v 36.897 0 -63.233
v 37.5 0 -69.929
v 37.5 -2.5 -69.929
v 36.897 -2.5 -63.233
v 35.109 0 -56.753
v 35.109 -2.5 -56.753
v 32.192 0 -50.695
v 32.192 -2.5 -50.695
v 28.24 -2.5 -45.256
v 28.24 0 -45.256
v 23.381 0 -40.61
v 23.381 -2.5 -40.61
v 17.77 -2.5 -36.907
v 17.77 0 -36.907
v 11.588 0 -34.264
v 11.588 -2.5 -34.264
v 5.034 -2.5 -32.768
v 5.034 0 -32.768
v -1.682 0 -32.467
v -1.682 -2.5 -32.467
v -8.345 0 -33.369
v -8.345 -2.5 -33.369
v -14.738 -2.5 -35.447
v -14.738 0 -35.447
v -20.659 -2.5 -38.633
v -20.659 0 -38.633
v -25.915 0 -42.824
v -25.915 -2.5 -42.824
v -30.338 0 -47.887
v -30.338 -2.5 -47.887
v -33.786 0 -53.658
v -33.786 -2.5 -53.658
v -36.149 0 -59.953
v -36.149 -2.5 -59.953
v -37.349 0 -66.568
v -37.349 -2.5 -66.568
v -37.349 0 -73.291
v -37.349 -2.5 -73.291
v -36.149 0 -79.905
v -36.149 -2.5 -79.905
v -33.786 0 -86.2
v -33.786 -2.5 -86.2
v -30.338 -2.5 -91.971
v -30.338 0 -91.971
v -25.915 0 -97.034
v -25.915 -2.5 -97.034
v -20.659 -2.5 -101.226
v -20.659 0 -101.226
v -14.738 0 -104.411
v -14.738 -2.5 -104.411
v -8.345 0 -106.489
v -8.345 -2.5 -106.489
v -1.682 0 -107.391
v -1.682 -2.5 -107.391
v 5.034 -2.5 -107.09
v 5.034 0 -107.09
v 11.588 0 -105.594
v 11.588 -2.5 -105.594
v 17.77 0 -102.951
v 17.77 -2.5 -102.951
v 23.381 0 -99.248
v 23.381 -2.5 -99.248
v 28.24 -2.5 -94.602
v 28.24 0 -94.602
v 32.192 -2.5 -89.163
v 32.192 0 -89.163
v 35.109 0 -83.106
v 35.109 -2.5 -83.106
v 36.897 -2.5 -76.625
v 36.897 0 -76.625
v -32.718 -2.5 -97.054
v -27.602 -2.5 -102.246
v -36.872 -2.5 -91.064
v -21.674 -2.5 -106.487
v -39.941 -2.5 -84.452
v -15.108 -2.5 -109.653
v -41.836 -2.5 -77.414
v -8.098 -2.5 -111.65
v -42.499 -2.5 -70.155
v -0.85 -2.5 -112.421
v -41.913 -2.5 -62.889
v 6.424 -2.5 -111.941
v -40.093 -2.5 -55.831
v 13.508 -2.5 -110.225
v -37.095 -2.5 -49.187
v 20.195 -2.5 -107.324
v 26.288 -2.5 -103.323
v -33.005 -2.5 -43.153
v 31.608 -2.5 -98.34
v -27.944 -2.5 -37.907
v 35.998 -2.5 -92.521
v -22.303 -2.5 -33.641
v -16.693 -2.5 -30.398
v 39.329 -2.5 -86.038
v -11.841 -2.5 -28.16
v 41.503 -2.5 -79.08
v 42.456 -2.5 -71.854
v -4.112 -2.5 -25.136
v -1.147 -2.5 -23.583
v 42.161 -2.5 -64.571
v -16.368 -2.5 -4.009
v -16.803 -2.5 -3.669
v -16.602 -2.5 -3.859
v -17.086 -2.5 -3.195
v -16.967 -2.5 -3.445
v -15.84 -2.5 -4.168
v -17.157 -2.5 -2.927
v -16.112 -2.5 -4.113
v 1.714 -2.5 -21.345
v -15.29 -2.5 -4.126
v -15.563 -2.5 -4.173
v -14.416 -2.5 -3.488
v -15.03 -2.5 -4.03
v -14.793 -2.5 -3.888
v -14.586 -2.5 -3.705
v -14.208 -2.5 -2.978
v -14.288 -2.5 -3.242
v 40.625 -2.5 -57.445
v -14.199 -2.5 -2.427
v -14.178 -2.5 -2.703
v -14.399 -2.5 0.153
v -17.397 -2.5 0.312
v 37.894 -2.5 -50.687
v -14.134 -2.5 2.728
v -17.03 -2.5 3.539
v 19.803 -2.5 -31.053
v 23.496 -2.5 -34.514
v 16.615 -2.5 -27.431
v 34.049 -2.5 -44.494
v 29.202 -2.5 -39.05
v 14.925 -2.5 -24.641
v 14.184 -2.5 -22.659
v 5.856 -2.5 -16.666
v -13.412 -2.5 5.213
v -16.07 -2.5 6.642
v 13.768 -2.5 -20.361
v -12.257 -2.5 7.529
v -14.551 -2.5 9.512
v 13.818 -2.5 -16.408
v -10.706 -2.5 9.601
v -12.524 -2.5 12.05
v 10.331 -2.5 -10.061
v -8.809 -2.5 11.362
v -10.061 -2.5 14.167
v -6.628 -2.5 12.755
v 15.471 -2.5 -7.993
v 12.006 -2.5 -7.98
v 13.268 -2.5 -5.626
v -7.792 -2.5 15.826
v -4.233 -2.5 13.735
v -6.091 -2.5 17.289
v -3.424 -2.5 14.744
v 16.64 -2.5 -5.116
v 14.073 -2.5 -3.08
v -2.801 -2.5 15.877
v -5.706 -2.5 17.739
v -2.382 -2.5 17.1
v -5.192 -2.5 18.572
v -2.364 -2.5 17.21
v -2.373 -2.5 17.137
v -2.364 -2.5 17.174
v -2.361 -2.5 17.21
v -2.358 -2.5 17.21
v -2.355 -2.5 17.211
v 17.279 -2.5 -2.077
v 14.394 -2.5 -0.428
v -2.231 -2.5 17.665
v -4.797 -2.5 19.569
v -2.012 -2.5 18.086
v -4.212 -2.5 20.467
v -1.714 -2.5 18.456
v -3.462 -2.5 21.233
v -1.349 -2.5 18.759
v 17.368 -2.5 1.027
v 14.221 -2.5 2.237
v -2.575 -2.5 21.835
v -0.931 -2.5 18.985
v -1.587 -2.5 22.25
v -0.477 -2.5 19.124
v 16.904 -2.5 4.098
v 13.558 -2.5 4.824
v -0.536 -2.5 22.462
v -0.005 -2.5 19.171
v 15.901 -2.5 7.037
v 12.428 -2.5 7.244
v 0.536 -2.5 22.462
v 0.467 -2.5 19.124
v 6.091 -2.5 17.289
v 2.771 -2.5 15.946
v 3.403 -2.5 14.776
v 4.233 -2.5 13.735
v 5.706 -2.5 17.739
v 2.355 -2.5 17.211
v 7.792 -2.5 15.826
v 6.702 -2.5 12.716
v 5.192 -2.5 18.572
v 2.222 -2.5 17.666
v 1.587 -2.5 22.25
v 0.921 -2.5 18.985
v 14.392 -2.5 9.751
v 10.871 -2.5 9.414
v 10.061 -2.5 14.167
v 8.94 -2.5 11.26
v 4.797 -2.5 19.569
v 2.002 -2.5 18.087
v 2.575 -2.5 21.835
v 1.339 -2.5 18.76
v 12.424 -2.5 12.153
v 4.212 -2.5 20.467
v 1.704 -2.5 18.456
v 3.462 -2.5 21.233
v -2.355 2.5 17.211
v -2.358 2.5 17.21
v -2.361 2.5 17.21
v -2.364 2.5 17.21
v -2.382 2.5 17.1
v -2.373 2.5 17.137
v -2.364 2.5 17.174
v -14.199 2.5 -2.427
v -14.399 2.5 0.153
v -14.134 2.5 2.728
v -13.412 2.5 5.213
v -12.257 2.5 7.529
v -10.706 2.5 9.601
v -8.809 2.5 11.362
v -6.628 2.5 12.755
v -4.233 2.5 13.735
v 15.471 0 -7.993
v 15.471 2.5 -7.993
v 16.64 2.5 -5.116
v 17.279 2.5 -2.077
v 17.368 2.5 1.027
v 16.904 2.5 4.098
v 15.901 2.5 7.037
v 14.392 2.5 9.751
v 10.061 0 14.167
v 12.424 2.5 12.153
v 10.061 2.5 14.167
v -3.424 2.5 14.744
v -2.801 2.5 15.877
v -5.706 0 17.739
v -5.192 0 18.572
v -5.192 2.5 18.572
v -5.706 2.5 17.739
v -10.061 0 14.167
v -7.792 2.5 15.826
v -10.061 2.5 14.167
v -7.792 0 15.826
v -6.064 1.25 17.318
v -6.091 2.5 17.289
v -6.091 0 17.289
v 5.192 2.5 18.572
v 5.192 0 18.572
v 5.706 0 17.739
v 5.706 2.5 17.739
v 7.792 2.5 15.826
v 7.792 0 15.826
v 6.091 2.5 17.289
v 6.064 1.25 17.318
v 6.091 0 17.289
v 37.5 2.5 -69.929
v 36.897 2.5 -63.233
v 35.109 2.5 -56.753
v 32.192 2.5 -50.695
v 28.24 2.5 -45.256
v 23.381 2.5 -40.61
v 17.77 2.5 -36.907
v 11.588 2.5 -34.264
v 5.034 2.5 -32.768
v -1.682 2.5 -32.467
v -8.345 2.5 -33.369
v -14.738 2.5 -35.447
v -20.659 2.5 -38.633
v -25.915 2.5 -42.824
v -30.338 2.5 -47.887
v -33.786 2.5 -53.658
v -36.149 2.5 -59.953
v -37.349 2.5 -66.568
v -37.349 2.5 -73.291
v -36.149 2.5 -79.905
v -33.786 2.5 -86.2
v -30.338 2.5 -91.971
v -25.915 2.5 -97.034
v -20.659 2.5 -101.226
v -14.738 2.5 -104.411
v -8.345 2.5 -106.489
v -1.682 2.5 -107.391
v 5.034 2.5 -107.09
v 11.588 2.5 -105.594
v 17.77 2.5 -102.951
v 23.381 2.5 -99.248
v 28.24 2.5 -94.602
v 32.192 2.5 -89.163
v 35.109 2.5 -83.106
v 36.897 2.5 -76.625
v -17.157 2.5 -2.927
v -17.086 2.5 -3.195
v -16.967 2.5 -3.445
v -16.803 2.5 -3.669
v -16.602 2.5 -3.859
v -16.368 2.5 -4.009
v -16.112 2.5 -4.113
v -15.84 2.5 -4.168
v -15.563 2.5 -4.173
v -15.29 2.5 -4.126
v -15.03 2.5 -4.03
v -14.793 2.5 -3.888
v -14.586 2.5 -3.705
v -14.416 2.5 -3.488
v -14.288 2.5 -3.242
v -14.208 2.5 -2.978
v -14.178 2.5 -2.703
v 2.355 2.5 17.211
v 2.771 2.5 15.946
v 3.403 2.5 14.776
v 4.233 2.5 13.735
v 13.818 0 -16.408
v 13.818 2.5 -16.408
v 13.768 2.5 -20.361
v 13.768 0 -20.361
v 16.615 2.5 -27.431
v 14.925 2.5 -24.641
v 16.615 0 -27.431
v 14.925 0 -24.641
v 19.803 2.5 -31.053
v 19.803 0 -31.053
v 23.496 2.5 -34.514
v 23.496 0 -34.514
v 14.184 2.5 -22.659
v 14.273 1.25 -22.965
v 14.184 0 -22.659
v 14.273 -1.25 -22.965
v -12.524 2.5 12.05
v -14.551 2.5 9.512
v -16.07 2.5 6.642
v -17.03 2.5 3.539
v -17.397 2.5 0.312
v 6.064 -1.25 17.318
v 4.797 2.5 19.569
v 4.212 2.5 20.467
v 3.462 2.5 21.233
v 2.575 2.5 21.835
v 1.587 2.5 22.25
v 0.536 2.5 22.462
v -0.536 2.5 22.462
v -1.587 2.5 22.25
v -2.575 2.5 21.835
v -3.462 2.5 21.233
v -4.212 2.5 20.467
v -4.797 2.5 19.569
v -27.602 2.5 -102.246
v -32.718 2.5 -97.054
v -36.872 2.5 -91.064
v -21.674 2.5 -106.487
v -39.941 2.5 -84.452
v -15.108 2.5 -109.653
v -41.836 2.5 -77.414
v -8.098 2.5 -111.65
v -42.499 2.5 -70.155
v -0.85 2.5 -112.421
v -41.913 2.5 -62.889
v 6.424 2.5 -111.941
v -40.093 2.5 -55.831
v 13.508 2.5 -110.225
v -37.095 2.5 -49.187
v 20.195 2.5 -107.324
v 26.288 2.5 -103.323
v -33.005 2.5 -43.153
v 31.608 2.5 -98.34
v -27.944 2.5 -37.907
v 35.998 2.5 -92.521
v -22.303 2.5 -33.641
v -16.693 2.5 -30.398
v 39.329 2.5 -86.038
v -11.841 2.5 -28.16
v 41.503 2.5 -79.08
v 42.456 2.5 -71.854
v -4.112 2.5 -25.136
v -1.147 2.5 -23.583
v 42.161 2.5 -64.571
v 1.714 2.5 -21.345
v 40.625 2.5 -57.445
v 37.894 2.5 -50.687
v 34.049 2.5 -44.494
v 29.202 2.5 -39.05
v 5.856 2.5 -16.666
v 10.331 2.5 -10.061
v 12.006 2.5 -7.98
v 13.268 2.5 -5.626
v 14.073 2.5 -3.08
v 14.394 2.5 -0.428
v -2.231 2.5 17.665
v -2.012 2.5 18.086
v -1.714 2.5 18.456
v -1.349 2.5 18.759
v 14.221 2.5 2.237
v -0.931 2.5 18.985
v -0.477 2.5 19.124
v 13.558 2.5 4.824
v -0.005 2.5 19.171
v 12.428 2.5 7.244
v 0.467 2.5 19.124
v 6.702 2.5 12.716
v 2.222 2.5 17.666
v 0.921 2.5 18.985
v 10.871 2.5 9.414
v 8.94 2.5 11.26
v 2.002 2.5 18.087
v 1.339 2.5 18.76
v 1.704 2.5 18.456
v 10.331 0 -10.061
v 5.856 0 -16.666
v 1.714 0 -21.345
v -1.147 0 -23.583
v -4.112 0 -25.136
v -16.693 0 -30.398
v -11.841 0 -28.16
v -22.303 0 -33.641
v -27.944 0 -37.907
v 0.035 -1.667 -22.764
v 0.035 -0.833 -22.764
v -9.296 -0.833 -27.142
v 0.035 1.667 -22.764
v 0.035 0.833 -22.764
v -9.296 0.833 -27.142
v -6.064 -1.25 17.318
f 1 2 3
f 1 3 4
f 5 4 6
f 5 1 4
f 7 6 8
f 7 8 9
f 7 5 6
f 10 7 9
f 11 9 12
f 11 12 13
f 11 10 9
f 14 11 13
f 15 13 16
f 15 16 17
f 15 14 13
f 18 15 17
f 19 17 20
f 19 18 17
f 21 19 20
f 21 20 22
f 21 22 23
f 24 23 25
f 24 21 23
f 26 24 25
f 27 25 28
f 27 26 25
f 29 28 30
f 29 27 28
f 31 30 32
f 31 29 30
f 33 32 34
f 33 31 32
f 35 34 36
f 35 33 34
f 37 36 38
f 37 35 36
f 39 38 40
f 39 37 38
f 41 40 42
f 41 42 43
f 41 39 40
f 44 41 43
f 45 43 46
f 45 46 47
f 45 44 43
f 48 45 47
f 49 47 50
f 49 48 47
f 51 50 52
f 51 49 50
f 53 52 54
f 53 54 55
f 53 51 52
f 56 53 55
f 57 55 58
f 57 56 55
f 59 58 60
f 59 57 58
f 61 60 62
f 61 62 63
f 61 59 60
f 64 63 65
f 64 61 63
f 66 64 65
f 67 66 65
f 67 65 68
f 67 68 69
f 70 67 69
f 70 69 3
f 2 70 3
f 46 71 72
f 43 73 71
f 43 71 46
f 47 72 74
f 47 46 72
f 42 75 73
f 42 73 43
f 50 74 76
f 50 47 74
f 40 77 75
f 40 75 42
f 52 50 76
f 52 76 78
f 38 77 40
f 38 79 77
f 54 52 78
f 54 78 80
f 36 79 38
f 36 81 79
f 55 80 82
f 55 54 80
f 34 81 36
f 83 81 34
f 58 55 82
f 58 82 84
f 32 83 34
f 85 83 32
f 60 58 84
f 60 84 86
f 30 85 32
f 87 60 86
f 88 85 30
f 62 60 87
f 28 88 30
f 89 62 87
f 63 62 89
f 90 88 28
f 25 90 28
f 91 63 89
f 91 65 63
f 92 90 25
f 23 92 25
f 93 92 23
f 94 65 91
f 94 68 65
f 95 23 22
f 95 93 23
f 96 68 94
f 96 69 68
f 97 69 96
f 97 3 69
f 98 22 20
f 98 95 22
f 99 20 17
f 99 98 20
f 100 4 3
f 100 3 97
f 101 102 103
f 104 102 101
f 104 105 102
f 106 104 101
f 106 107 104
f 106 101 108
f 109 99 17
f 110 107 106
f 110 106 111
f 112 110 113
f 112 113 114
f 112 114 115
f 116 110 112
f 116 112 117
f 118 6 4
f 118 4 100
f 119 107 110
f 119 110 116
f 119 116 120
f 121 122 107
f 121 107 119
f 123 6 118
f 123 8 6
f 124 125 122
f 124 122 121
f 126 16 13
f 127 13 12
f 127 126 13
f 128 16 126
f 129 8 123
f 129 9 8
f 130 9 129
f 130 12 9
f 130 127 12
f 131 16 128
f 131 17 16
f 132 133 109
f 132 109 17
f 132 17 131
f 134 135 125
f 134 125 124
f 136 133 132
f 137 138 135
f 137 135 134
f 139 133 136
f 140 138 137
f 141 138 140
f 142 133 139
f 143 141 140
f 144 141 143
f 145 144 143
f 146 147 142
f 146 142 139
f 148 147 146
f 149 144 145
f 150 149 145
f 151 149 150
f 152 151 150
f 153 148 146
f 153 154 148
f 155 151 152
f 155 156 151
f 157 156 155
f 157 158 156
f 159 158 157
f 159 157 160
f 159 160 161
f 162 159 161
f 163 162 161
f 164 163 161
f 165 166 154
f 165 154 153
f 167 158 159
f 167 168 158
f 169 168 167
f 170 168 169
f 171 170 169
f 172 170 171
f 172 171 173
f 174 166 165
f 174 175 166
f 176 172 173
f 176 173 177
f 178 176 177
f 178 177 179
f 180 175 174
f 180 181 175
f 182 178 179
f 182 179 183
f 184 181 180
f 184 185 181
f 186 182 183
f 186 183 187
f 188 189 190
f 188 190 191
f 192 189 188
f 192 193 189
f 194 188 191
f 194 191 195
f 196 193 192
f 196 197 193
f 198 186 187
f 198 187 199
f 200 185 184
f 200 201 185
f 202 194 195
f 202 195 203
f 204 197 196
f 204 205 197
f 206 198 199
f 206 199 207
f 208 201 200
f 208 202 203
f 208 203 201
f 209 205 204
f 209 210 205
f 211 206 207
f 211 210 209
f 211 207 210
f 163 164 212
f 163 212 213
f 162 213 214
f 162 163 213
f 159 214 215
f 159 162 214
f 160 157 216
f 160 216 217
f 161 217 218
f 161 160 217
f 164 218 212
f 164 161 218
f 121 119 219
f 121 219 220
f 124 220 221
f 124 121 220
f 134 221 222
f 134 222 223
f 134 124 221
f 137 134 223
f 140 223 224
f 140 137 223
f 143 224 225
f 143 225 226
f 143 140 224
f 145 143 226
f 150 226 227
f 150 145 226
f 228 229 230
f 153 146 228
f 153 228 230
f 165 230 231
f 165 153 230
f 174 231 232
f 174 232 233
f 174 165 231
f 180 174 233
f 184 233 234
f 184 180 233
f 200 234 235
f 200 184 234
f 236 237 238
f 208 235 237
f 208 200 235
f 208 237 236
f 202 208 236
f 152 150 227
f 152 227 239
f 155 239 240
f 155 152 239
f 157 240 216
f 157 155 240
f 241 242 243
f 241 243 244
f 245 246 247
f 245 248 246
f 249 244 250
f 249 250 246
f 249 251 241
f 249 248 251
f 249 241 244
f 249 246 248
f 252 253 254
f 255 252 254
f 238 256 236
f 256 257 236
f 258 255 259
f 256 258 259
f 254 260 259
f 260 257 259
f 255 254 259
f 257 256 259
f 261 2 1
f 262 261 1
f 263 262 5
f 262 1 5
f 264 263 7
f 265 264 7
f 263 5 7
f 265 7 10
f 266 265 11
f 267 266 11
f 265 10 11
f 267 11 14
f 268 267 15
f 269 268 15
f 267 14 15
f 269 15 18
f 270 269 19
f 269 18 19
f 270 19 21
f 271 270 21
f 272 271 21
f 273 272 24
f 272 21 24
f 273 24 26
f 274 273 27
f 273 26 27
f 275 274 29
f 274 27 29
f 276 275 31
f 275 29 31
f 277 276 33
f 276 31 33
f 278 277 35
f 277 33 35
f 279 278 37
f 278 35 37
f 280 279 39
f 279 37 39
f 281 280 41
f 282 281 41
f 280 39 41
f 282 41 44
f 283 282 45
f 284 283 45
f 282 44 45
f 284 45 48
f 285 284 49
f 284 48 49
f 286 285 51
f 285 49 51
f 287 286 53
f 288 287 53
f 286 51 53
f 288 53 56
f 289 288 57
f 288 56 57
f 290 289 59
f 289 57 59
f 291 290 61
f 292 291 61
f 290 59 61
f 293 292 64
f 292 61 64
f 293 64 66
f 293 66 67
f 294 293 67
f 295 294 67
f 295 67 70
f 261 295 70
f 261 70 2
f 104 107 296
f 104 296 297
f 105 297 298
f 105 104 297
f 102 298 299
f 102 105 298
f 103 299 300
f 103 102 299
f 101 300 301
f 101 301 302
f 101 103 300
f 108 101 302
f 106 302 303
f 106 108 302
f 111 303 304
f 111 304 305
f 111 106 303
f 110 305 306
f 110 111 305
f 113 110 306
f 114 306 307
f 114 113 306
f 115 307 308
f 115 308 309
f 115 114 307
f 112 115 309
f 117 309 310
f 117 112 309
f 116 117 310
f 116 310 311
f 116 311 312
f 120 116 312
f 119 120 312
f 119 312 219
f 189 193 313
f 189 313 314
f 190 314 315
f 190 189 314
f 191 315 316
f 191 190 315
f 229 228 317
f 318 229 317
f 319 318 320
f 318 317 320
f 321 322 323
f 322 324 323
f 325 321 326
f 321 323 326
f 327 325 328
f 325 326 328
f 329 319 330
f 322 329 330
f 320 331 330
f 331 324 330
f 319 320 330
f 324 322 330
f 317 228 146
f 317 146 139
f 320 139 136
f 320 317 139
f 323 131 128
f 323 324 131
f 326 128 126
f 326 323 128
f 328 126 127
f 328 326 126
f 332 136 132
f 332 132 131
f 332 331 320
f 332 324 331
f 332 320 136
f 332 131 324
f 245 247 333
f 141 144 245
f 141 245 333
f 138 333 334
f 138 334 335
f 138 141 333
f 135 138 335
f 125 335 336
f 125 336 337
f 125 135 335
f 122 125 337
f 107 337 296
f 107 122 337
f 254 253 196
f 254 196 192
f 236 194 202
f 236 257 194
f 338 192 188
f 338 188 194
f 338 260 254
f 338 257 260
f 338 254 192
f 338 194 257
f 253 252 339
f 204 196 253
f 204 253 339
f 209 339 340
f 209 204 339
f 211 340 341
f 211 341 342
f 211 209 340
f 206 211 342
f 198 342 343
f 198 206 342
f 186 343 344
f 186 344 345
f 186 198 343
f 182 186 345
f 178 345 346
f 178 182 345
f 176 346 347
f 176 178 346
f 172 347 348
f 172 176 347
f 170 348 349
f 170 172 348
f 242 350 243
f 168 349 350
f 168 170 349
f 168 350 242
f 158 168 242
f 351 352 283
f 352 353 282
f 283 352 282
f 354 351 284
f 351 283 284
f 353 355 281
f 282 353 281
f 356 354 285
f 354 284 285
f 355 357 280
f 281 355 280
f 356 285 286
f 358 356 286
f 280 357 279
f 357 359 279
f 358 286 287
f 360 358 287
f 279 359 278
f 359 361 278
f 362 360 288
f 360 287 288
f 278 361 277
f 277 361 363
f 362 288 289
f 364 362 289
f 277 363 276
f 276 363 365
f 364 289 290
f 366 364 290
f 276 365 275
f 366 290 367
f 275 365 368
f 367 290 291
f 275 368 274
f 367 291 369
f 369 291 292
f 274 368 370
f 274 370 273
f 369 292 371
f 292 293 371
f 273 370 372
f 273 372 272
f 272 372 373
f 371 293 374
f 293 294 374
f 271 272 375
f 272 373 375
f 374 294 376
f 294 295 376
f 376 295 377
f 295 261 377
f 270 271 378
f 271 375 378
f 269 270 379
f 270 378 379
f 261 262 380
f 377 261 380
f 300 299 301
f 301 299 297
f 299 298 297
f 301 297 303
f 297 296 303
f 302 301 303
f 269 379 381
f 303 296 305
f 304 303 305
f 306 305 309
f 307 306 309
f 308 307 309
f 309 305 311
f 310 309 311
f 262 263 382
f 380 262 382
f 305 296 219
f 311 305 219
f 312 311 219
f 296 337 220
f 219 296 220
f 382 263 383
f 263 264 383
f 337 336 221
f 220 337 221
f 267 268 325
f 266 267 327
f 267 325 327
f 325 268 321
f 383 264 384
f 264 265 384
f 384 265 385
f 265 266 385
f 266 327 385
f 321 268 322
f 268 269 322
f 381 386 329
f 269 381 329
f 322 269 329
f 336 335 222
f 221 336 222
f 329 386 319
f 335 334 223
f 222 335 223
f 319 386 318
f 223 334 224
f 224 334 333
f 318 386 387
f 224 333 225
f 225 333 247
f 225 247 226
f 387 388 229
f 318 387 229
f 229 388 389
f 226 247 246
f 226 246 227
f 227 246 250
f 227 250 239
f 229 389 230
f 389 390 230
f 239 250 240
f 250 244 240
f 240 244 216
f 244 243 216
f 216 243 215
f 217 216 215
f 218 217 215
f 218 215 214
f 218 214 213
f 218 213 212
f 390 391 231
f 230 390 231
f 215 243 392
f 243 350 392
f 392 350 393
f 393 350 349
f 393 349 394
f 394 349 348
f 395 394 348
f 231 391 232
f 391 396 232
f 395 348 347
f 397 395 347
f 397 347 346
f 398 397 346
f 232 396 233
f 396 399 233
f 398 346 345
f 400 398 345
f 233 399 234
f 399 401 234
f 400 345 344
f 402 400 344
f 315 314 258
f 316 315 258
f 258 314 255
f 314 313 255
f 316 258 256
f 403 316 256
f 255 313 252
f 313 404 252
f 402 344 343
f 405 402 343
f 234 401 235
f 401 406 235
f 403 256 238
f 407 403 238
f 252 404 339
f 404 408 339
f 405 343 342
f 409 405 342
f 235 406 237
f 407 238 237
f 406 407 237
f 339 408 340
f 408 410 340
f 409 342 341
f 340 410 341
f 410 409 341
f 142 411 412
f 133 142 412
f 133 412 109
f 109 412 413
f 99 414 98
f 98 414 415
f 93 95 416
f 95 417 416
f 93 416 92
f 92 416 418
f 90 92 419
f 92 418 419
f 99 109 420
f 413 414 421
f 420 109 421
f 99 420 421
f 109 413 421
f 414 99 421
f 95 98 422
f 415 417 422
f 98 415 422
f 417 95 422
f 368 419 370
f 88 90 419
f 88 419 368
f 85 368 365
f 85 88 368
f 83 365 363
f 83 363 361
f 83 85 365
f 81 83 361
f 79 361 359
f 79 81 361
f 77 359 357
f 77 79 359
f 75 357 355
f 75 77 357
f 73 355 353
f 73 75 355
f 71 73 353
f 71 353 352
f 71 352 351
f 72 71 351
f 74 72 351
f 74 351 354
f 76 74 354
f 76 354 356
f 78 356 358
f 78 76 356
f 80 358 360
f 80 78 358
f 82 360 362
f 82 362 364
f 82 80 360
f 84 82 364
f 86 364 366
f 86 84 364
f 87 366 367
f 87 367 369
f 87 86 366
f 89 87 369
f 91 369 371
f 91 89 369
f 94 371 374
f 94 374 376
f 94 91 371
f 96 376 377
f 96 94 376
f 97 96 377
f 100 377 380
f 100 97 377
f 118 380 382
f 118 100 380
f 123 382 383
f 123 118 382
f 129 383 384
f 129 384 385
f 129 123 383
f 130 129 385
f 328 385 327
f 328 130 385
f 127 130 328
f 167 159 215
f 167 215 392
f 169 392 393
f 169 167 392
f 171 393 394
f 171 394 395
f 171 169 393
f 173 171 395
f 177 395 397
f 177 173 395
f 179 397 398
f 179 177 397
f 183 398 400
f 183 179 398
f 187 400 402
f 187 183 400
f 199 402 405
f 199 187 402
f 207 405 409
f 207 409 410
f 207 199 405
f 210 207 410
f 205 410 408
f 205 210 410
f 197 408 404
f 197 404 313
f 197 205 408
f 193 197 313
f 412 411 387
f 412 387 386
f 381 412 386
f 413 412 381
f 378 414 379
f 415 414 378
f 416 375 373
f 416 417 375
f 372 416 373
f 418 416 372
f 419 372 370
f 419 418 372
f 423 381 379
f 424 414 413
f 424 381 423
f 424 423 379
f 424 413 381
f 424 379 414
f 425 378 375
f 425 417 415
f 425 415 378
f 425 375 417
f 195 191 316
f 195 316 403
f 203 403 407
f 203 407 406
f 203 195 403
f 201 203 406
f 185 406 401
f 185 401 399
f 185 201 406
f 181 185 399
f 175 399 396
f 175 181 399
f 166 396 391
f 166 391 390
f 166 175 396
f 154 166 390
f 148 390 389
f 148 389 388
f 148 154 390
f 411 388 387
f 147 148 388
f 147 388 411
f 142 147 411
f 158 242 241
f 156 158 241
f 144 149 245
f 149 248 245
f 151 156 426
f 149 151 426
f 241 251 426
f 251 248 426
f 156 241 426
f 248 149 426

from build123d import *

# Parameters (mm, degrees)
F0_R     = 37.5
F1_DEPTH = 2.5


with BuildPart() as f1:
    # F0 (on Front) → F1 (new body, symmetric)
    with BuildSketch(Plane.XZ):
        with BuildLine():
            ThreePointArc((23.495791584, -34.5144310796), (-2.7972530191, -27.5212402414), (-27.9439404953, -37.9074340379))
            ThreePointArc((-27.9439404953, -37.9074340379), (-17.5873893593, -108.6193138327), (42.5, -69.9290859253))
            ThreePointArc((42.5, -69.9290859253), (37.4487726255, -49.8333294369), (23.495791584, -34.5144310796))
        make_face()
        with Locations((0, -69.9290859253)):
            Circle(F0_R, mode=Mode.SUBTRACT)
        with BuildLine():
            add(Edge.make_bspline(
                [(5.1920566863, 18.5723408589), (5.4030836199, 18.1737175795), (6.009346047, 17.0894557175), (8.4647401185, 15.2993210086), (10.0607038312, 14.1674244584)],
                knots=[0, 0, 0, 0, 0.353980682, 1, 1, 1, 1], degree=3))
            ThreePointArc((5.1920566863, 18.5723408589), (0, 22.4882426928), (-5.1920566863, 18.5723408589))
            add(Edge.make_bspline(
                [(-5.1920566863, 18.5723408589), (-5.4030836199, 18.1737175795), (-6.009346047, 17.0894557175), (-8.4647401185, 15.2993210086), (-10.0607038312, 14.1674244584)],
                knots=[0, 0, 0, 0, 0.353980682, 1, 1, 1, 1], degree=3))
            ThreePointArc((-10.0607038312, 14.1674244584), (-16.0703171245, 6.6420670409), (-17.1570047894, -2.9269227761))
            ThreePointArc((-17.1570047894, -2.9269227761), (-16.488459767, -3.9392853203), (-15.2897240847, -4.1260020361))
            ThreePointArc((-15.2897240847, -4.1260020361), (-14.4157806287, -3.4876204113), (-14.1989005153, -2.4273038173))
            ThreePointArc((-14.1989005153, -2.4273038173), (-12.2569494075, 7.5291203707), (-4.2325370023, 13.7347921529))
            ThreePointArc((-4.2325370023, 13.7347921529), (-3.0879498251, 15.2971102039), (-2.3815860794, 17.1004315168))
            ThreePointArc((-2.3815860794, 17.1004315168), (-2.3733660378, 17.1550903584), (-2.3638894327, 17.2095454042))
            ThreePointArc((-2.3638894327, 17.2095454042), (-0.0049388321, 19.1708665497), (2.3550204808, 17.2107592534))
            ThreePointArc((2.3550204808, 17.2107592534), (3.060795291, 15.3469315093), (4.2325370023, 13.7347921529))
            ThreePointArc((4.2325370023, 13.7347921529), (13.9491841539, 3.5458163369), (10.330929233, -10.0606781189))
            add(Edge.make_bspline(
                [(10.330929233, -10.0606781189), (7.0163060906, -15.4310663182), (0.8325115992, -23.801862272), (-9.7668403245, -26.9773220336), (-21.5660588981, -32.3417266701), (-27.9439404953, -37.9074340379)],
                knots=[0, 0, 0, 0, 0.3399679741, 0.609879003, 1, 1, 1, 1], degree=3))
            ThreePointArc((-27.9439404953, -37.9074340379), (-2.7972530191, -27.5212402414), (23.495791584, -34.5144310796))
            add(Edge.make_bspline(
                [(15.4707114186, -7.9926174921), (14.2001866213, -13.2718644657), (11.6427356628, -23.7542991739), (19.5641259536, -30.9373140161), (23.495791584, -34.5144310796)],
                knots=[0, 0, 0, 0, 0.5020174455, 1, 1, 1, 1], degree=3))
            ThreePointArc((15.4707114186, -7.9926174921), (16.9035545368, 4.0975903429), (10.0607038312, 14.1674244584))
        make_face()
        with BuildLine():
            ThreePointArc((-2.3638894327, 17.2095454042), (-2.3733660378, 17.1550903584), (-2.3815860794, 17.1004315168))
            ThreePointArc((-2.3815860794, 17.1004315168), (-2.3680946087, 17.1555451395), (-2.3550204808, 17.2107592534))
            ThreePointArc((-2.3550204808, 17.2107592534), (-2.3594550348, 17.2101528992), (-2.3638894327, 17.2095454042))
        make_face()
    extrude(amount=F1_DEPTH, both=True)


solid = f1.part
